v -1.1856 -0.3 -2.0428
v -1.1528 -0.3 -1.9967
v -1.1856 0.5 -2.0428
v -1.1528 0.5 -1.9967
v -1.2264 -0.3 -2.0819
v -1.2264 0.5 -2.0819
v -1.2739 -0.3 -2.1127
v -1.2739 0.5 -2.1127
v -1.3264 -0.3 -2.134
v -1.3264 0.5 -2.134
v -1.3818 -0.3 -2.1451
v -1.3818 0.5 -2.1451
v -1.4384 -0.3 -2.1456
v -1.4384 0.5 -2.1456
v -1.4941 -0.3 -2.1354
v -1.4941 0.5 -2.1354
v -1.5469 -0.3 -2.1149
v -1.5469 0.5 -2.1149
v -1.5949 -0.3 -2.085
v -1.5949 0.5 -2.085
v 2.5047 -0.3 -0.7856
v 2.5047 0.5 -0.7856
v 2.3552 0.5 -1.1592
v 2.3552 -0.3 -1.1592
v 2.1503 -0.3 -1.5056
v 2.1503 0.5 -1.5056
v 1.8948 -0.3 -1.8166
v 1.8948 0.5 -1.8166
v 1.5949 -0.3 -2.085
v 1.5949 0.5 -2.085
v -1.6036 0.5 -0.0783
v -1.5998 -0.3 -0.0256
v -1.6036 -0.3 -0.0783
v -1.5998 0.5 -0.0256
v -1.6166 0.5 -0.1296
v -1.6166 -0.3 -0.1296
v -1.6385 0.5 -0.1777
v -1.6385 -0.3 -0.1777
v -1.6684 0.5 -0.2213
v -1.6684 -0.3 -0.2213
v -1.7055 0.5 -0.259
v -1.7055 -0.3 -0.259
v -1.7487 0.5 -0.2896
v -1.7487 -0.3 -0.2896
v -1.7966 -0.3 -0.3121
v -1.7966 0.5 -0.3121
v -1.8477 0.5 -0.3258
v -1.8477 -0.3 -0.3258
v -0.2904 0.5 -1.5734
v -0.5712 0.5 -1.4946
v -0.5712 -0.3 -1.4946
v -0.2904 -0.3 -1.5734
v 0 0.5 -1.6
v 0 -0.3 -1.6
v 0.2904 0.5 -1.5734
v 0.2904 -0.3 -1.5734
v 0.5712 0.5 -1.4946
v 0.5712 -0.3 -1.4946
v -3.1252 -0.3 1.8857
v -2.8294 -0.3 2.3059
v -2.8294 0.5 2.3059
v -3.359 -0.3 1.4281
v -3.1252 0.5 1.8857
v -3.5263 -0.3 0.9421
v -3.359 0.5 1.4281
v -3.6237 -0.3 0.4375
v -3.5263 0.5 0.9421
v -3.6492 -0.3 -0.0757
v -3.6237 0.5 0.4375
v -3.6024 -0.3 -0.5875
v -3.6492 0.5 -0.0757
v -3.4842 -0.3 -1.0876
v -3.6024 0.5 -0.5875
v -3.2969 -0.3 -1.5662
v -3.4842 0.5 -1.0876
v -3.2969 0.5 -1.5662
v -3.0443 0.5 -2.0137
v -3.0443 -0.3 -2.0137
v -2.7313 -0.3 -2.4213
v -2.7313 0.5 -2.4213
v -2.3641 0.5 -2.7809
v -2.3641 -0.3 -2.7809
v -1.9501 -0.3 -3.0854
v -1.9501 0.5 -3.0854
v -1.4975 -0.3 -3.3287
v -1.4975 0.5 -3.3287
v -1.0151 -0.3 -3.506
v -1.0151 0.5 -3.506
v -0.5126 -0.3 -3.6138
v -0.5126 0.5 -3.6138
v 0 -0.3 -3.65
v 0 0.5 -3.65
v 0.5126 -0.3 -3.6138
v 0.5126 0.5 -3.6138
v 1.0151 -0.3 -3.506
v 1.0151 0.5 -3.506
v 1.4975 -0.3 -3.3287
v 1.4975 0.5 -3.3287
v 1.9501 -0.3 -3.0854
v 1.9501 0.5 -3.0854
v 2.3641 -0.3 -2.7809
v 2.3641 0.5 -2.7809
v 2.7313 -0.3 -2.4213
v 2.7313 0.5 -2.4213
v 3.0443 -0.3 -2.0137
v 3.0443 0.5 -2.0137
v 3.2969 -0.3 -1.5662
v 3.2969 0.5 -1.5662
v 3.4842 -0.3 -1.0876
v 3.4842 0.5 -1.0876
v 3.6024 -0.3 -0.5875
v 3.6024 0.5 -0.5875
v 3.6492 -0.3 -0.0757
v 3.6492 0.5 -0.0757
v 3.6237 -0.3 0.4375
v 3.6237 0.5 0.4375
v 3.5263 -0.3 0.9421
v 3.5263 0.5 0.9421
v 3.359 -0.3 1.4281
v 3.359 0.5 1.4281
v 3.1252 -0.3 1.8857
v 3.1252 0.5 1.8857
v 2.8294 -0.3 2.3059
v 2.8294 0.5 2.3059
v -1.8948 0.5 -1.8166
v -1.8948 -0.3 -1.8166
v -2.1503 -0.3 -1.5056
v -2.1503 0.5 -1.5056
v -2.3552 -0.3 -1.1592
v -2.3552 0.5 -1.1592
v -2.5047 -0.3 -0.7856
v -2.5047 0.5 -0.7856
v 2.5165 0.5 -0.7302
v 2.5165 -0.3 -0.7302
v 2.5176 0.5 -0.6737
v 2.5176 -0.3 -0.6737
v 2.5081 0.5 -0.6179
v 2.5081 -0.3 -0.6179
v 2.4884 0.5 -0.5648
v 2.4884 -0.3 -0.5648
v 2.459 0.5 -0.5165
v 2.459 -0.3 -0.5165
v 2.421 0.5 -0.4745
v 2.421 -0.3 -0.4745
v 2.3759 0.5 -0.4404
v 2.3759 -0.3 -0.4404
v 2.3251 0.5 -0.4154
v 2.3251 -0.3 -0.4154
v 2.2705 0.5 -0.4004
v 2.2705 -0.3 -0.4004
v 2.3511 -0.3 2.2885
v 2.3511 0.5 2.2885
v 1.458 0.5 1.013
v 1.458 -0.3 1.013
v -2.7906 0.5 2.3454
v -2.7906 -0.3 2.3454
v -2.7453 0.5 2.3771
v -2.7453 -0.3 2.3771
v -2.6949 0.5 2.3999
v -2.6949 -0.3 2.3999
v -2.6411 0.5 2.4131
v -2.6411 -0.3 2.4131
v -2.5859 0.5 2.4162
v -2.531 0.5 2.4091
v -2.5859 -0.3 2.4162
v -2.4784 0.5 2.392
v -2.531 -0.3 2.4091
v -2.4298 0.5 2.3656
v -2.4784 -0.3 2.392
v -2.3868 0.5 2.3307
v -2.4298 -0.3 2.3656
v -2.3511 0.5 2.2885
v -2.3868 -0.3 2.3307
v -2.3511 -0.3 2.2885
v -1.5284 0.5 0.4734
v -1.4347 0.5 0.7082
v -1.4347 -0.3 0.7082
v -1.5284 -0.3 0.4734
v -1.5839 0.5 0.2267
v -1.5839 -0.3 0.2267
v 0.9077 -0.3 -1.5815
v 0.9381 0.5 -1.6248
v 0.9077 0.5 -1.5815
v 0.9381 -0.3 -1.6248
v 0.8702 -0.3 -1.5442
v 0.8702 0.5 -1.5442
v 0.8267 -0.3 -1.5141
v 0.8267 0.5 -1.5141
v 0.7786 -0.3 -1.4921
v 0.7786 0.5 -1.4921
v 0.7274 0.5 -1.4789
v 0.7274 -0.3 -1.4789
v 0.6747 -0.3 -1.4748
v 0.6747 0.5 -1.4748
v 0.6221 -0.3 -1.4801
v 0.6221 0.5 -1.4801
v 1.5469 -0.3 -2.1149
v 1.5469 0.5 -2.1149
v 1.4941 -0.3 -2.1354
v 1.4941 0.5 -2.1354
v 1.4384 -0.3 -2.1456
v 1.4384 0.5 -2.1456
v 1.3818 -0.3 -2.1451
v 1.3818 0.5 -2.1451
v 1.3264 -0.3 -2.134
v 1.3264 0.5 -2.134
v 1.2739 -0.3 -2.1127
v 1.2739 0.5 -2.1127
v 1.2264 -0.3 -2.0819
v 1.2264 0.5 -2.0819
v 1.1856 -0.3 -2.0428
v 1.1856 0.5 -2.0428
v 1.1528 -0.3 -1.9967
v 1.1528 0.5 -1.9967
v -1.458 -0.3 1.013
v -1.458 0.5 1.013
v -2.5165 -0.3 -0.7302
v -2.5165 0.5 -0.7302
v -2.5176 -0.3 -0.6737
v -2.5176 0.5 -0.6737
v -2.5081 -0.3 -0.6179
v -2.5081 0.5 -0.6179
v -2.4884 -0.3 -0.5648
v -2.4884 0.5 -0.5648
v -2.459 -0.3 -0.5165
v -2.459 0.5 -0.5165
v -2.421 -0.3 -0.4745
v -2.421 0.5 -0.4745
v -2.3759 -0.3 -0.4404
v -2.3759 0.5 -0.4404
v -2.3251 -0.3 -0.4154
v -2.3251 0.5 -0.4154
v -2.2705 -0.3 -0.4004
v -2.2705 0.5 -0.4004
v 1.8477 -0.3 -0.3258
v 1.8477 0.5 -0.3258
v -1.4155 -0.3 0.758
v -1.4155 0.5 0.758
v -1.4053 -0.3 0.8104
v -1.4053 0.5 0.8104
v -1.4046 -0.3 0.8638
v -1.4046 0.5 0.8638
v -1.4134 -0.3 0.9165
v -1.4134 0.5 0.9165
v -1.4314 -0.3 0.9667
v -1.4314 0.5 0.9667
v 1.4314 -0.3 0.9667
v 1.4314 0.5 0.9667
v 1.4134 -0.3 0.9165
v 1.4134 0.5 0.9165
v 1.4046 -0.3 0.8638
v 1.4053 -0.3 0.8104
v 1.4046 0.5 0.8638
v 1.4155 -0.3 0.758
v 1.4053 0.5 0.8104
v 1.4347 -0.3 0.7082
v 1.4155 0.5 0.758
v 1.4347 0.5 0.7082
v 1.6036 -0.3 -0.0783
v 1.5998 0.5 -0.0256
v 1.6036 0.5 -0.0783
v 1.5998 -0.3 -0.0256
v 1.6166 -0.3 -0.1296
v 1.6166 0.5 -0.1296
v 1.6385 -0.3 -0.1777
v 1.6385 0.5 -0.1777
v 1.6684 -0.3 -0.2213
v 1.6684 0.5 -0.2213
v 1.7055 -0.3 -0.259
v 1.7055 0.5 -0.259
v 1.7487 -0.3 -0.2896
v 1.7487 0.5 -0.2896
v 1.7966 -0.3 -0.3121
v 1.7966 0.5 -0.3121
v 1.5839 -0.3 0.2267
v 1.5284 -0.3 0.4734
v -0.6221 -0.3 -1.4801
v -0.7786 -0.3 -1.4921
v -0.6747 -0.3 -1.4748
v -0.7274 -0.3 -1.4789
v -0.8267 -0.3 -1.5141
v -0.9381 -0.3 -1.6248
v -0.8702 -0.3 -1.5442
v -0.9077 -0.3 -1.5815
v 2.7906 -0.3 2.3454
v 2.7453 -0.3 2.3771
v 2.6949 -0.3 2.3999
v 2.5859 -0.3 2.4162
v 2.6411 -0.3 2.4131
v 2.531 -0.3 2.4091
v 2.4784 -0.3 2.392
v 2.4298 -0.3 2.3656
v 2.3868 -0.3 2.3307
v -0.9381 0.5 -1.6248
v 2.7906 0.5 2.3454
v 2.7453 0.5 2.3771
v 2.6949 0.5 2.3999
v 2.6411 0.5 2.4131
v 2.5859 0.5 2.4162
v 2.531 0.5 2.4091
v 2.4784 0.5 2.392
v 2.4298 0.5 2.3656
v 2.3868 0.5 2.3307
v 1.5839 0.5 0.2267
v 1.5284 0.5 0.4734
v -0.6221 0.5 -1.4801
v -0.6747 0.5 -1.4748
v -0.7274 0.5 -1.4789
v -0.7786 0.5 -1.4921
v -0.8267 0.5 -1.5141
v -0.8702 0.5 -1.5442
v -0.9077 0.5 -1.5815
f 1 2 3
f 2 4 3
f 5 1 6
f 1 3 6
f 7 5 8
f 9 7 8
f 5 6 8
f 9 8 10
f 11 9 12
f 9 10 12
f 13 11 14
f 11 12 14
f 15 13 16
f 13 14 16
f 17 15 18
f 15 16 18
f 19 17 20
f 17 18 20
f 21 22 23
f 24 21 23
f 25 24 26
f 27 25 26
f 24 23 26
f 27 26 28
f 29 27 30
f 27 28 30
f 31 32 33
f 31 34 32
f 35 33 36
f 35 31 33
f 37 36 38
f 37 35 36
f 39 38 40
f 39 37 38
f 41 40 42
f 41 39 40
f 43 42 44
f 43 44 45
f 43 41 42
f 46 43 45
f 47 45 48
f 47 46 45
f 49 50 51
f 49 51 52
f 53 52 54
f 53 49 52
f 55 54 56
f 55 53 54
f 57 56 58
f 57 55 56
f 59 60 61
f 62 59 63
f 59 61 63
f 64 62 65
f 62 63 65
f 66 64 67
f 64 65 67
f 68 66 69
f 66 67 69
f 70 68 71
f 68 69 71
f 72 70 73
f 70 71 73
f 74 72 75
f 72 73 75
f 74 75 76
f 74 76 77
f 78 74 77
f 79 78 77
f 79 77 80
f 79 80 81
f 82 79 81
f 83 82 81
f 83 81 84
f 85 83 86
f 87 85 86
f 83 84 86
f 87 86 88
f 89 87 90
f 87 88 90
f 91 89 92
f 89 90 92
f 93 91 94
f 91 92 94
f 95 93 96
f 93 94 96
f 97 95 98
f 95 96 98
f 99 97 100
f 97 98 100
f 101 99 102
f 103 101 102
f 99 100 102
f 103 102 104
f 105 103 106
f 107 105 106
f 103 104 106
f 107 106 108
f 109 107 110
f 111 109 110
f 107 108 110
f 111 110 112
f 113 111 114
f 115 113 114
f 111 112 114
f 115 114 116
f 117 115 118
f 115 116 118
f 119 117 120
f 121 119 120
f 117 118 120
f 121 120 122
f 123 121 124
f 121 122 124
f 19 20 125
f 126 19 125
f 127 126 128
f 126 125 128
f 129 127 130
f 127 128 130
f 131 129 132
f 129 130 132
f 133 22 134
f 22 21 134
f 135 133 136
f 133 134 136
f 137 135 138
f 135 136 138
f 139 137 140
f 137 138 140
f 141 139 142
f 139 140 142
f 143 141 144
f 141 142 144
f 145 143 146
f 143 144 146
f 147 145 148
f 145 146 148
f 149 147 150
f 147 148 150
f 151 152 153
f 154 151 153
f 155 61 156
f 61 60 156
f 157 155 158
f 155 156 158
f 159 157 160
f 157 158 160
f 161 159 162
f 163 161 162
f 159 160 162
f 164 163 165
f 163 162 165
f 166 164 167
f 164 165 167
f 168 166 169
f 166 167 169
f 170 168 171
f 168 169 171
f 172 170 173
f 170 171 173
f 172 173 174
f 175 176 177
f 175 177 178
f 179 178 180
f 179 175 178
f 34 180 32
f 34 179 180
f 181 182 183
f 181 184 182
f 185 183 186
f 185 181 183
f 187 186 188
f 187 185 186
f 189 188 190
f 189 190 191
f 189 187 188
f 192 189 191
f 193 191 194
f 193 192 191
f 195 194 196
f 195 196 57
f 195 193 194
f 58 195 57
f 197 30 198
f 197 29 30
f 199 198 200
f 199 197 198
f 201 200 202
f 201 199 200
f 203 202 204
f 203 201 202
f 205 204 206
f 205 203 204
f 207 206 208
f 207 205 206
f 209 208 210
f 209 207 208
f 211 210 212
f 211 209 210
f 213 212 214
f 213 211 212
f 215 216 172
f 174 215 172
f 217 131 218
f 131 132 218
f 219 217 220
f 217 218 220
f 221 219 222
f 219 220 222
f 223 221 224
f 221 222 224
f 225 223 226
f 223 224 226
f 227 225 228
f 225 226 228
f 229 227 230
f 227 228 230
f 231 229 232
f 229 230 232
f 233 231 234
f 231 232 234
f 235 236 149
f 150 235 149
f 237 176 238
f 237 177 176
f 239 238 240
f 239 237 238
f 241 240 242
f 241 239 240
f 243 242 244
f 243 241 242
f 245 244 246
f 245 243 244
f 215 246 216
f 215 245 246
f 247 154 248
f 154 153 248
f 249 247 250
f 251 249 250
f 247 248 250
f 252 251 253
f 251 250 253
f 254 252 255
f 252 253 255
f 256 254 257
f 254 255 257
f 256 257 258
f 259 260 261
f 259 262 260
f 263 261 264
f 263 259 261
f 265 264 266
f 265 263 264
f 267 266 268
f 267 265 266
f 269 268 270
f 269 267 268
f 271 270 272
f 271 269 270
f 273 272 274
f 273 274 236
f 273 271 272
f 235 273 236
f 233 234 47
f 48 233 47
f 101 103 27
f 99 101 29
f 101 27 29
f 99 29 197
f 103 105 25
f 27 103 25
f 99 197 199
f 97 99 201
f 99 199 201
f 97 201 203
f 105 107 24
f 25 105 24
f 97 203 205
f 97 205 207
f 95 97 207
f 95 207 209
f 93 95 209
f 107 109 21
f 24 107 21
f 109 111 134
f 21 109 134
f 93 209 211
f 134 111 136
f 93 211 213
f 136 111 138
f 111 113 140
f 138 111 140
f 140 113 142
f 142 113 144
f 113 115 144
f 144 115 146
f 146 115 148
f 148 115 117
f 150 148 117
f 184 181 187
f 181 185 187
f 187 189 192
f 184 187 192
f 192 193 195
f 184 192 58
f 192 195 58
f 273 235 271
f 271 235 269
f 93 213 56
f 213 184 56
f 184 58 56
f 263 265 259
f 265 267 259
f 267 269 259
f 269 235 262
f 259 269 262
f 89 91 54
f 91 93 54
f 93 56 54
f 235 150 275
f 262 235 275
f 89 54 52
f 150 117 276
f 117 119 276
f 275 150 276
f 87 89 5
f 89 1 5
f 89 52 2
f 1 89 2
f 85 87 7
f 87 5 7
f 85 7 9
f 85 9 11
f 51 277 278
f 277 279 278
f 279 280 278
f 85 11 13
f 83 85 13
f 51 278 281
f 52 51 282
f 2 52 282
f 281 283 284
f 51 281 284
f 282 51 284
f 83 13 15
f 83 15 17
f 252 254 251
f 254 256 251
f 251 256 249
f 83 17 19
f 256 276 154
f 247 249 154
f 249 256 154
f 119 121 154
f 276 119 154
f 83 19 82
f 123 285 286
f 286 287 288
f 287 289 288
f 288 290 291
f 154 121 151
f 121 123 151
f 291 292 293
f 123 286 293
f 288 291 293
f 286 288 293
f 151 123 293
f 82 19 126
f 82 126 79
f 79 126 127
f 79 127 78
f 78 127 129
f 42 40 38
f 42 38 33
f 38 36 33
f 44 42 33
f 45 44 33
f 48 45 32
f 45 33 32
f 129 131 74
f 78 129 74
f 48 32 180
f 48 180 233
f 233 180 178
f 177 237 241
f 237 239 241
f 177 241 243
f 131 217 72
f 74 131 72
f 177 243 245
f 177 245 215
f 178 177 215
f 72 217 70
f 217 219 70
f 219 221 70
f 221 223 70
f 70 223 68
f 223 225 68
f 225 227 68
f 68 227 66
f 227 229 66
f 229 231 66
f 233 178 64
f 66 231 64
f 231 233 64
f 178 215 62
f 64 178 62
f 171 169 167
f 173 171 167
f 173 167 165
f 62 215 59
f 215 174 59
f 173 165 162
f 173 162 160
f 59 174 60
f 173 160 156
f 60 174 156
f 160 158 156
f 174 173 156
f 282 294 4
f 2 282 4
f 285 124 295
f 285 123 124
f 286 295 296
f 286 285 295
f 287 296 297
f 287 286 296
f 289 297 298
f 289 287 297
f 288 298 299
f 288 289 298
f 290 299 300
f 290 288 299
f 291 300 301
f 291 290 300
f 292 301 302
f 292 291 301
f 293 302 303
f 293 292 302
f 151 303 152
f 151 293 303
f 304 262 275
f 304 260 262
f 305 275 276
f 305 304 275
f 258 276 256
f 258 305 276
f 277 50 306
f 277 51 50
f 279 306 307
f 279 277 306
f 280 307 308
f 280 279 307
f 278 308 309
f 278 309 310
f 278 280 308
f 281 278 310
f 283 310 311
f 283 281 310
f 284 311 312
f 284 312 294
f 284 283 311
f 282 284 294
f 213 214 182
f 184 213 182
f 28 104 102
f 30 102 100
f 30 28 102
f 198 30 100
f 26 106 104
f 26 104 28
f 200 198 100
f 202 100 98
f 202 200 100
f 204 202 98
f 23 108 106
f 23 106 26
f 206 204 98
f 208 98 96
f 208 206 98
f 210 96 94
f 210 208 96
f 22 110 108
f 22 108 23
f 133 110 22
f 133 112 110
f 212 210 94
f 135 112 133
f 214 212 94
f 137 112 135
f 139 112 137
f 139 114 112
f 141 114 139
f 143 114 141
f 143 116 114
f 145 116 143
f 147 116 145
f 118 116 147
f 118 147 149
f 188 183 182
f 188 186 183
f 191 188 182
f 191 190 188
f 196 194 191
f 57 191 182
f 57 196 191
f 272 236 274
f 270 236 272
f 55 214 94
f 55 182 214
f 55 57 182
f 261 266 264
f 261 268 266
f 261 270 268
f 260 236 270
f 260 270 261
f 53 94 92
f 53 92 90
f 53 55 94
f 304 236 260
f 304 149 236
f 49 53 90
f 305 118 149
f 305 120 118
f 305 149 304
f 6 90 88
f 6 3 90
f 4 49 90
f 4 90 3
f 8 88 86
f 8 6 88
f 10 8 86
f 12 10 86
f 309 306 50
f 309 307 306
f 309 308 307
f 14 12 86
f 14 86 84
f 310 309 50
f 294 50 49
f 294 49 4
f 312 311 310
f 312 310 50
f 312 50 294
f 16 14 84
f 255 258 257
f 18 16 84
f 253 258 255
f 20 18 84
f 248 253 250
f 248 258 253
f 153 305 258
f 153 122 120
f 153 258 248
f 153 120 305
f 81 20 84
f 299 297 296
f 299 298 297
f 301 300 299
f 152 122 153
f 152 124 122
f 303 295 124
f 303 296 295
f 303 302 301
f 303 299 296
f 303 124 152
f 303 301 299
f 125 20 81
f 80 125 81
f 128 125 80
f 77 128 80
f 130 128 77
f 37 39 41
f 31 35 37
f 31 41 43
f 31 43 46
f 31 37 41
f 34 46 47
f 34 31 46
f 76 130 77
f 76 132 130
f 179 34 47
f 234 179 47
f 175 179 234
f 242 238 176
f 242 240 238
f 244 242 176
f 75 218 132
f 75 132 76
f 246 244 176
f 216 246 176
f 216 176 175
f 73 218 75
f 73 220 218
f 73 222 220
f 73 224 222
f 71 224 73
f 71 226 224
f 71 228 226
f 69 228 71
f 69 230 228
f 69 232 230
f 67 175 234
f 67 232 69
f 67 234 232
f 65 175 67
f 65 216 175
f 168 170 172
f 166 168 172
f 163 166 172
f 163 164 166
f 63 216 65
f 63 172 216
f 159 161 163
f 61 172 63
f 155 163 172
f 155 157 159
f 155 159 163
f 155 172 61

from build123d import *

# Parameters (mm, degrees)
SKETCH4_W                 = 2.05
SKETCH4_H                 = 0.8
SKETCH5_OUTSIDE_W         = 11.37
SKETCH5_OUTSIDE_H         = 11.37
CUT_INNER_BODY_DEPTH      = 1.5
CUT_INNER_BODY_DEPTH_BACK = 1.3
FILLET_2_R                = 0.3


with BuildPart() as part:
    # Sketch4 → Clip (revolve)
    with BuildSketch(Plane.XY):
        with Locations((2.625, 0.1)):
            Rectangle(SKETCH4_W, SKETCH4_H)
    revolve(axis=Axis((0, 0.5, 0), (0, -1, 0)))

    # Sketch5 outside → Cut-Inner-Body (cut, two sides)
    with BuildSketch(Plane(origin=(0, 0, 0), x_dir=(1, 0, 0), z_dir=(0, 1, 0))) as cut_inner_body_sk:
        Rectangle(SKETCH5_OUTSIDE_W, SKETCH5_OUTSIDE_H)
        with BuildLine():
            Line((2.566160275, -2.595635075), (1.35, -0.858778202))
            ThreePointArc((1.35, -0.858778202), (1.569360567, -0.31162062), (1.575692405, 0.277837084))
            Line((1.575692405, 0.277837084), (2.585120352, 0.455826466))
            ThreePointArc((2.585120352, 0.455826466), (2.150274116, 1.505638145), (1.3125, 2.273316685))
            Line((1.3125, 2.273316685), (0.8, 1.385640646))
            ThreePointArc((0.8, 1.385640646), (0, 1.6), (-0.8, 1.385640646))
            Line((-0.8, 1.385640646), (-1.3125, 2.273316685))
            ThreePointArc((-1.3125, 2.273316685), (-2.150274116, 1.505638145), (-2.585120352, 0.455826466))
            Line((-2.585120352, 0.455826466), (-1.575692405, 0.277837084))
            ThreePointArc((-1.575692405, 0.277837084), (-1.569360567, -0.31162062), (-1.35, -0.858778202))
            Line((-1.35, -0.858778202), (-2.566160275, -2.595635075))
            ThreePointArc((-2.566160275, -2.595635075), (0, 3.65), (2.566160275, -2.595635075))
        make_face(mode=Mode.SUBTRACT)
    extrude(amount=CUT_INNER_BODY_DEPTH, mode=Mode.SUBTRACT)
    extrude(cut_inner_body_sk.sketch, amount=-CUT_INNER_BODY_DEPTH_BACK, mode=Mode.SUBTRACT)

    # Fillet 2
    fillet_2_edges = [part.edges().sort_by_distance(p)[0] for p in [
        (2.566160275, 0.1, 2.595635075),
        (1.35, 0.1, 0.858778202),
        (1.575692405, 0.1, -0.277837084),
        (2.585120352, 0.1, -0.455826466),
        (1.3125, 0.1, -2.273316685),
        (0.8, 0.1, -1.385640646),
        (-0.8, 0.1, -1.385640646),
        (-1.3125, 0.1, -2.273316685),
        (-2.585120352, 0.1, -0.455826466),
        (-1.575692405, 0.1, -0.277837084),
        (-1.35, 0.1, 0.858778202),
        (-2.566160275, 0.1, 2.595635075),
    ]]
    fillet(fillet_2_edges, radius=FILLET_2_R)


solid = part.part
